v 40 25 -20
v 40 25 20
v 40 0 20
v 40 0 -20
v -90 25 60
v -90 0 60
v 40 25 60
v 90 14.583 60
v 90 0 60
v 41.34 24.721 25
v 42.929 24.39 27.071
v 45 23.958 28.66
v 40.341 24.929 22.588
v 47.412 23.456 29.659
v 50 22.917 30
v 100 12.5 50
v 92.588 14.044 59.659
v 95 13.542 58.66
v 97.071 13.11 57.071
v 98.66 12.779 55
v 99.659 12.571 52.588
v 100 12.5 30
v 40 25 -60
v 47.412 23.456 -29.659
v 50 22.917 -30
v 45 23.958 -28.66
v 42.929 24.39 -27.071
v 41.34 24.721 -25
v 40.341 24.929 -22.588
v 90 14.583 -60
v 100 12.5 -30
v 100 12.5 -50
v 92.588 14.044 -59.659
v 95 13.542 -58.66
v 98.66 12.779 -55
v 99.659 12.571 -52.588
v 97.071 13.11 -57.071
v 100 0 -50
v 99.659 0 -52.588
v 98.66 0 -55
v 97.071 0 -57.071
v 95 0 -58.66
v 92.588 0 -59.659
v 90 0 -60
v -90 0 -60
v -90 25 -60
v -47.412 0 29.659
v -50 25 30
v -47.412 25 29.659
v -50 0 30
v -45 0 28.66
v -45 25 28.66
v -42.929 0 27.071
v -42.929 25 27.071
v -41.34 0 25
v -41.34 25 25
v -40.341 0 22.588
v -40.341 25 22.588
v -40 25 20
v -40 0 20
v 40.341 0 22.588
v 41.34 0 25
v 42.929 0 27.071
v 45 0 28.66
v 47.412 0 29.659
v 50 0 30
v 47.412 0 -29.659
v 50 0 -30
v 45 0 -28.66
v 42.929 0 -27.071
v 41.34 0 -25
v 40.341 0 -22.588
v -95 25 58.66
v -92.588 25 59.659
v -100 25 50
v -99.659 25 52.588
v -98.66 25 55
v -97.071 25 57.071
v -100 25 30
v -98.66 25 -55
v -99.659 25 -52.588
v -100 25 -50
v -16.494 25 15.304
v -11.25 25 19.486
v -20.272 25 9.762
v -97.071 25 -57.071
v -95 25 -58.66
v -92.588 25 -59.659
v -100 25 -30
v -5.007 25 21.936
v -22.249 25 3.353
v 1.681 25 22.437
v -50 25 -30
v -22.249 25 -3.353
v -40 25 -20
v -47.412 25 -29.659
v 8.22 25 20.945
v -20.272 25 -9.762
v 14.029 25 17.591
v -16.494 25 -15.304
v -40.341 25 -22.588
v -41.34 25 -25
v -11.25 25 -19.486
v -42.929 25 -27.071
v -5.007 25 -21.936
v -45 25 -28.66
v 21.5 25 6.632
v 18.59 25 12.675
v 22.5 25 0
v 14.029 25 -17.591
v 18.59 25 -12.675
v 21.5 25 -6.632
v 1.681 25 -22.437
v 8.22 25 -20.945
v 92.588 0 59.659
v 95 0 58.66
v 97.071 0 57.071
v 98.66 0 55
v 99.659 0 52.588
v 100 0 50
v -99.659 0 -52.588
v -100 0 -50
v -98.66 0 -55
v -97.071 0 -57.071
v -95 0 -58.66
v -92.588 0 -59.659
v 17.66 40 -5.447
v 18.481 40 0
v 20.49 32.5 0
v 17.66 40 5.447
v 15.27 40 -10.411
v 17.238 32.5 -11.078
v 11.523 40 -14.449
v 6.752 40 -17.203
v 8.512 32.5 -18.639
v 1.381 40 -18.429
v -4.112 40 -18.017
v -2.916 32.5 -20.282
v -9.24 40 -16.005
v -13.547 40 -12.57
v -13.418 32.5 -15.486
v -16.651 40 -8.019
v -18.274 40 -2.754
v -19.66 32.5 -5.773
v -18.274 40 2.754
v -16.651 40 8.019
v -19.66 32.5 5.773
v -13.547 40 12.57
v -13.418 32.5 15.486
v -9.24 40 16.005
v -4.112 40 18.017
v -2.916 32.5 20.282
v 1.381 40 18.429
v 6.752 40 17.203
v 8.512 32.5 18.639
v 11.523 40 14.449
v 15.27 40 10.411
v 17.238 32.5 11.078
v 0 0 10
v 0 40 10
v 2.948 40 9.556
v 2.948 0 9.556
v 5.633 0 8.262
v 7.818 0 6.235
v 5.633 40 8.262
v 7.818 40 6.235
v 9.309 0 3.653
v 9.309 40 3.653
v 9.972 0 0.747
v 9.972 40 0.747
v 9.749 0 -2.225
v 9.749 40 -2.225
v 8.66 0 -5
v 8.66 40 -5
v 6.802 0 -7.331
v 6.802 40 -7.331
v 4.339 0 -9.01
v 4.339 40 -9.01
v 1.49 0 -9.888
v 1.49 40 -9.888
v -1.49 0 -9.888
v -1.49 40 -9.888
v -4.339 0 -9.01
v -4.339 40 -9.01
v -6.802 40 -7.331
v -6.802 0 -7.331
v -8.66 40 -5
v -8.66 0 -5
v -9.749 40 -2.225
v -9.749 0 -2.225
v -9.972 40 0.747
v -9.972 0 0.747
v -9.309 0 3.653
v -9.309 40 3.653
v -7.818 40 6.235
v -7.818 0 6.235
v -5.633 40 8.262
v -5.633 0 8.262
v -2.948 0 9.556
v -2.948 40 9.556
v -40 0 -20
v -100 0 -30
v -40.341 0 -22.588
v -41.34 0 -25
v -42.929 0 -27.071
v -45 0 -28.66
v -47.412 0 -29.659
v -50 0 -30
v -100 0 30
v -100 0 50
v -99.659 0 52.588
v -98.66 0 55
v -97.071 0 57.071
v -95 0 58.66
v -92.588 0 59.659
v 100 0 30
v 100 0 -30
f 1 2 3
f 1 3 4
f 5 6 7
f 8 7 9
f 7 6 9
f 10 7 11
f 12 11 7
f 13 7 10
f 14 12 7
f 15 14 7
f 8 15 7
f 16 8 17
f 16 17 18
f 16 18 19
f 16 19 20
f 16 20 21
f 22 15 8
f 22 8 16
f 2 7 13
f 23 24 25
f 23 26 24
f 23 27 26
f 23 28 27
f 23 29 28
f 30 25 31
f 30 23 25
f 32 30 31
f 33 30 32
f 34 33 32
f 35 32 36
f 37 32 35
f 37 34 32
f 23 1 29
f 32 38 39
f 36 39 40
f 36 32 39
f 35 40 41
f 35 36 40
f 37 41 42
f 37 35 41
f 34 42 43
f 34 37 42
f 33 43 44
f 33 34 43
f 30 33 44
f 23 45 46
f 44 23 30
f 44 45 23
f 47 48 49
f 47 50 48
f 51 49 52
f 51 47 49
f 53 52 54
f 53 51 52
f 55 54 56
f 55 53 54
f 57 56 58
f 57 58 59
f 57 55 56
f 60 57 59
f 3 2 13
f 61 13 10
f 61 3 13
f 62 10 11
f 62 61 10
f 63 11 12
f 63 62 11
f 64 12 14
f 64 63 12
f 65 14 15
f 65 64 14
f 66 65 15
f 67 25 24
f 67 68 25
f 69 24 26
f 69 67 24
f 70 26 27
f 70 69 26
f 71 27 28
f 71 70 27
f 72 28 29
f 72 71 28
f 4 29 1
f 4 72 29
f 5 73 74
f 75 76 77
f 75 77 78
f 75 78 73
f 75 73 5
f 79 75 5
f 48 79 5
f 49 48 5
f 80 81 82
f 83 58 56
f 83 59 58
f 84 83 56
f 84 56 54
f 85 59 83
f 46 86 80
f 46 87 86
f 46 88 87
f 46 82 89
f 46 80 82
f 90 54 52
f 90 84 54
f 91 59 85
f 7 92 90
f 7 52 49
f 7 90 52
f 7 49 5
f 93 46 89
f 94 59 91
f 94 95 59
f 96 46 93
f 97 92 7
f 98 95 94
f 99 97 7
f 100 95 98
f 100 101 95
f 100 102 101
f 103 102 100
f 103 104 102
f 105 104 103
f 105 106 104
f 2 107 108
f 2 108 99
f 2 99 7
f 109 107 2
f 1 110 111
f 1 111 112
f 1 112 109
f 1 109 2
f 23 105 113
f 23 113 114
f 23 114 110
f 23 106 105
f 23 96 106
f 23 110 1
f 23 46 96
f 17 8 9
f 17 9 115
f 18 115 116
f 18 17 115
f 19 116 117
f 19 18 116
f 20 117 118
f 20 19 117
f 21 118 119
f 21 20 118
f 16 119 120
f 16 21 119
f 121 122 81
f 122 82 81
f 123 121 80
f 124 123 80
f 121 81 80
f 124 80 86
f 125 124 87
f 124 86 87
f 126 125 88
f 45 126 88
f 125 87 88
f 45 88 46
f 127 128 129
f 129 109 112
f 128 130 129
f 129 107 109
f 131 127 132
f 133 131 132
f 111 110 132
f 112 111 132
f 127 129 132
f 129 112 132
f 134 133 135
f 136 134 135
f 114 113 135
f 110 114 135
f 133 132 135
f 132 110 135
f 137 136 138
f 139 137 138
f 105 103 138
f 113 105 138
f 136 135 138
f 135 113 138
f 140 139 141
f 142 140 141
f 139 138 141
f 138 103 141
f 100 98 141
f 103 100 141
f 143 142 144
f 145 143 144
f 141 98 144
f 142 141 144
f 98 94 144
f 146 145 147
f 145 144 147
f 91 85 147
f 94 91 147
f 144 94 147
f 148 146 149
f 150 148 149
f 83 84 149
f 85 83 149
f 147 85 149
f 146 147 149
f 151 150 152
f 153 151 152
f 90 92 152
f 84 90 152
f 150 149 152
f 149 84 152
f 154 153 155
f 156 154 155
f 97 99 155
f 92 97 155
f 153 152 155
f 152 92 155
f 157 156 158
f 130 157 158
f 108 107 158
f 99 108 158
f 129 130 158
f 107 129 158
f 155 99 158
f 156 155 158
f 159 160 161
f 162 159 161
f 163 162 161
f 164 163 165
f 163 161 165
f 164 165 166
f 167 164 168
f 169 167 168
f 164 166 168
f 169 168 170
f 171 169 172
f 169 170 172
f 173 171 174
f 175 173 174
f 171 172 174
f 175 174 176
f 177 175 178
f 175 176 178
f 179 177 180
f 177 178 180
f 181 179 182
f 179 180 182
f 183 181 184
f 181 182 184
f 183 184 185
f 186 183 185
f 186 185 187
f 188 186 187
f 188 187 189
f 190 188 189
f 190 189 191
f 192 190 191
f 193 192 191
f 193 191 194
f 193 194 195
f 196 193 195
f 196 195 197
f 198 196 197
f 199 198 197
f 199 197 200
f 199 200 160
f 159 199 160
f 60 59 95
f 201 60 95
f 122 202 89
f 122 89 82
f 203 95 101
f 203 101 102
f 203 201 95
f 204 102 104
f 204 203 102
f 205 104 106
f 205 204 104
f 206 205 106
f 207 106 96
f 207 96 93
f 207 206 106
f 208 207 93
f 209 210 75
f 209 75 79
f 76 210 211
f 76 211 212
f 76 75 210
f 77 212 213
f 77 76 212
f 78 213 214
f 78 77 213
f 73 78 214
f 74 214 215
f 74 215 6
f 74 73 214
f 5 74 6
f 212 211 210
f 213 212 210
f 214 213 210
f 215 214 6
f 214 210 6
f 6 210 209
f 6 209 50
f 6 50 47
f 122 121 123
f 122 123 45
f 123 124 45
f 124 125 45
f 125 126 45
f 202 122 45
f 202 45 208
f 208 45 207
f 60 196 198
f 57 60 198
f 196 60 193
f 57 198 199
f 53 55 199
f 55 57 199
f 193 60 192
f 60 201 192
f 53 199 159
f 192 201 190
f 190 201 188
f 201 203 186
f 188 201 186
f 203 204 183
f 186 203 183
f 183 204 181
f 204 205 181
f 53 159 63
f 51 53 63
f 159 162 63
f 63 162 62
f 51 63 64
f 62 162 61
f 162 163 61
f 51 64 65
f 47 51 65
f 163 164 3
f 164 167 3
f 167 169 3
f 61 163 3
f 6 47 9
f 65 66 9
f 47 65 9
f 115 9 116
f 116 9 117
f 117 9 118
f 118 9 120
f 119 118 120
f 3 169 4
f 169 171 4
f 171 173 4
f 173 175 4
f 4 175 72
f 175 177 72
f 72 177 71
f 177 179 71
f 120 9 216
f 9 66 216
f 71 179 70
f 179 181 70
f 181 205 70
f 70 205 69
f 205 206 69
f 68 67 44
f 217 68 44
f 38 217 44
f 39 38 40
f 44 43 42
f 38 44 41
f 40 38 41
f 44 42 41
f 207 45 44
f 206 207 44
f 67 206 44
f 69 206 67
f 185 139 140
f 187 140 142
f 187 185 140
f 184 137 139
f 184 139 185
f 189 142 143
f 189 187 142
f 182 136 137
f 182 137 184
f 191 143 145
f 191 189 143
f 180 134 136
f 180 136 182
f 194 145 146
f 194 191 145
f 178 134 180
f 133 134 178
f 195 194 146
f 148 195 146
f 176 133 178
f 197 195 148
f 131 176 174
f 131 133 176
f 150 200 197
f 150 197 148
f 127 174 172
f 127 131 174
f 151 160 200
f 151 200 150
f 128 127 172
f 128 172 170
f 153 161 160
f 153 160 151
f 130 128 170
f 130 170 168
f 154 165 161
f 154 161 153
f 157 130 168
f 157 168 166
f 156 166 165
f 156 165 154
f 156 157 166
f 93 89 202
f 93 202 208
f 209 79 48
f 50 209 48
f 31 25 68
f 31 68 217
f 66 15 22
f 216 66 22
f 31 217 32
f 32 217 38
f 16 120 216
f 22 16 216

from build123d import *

# Parameters (mm, degrees)
SKETCH1_W               = 200
SKETCH1_H               = 120
SKETCH1_R               = 22.5
BOSS_EXTRUDE1_DEPTH     = 25
SKETCH1_3_R             = 22.5
BOSS_EXTRUDE2_DEPTH     = 40
SKETCH2_R               = 10
CUT_EXTRUDE1_DEPTH      = 124.288280059
FILLET1_R               = 10
SKETCH3_W               = 60
SKETCH3_H               = 60
CUT_EXTRUDE2_DEPTH      = 120.268604419
FILLET2_R               = 10
CUT_EXTRUDE3_DEPTH      = 124.288280059
CUT_EXTRUDE3_DEPTH_BACK = 124.288280059


# Read off the part's stored shape, not the designer's step: Draft1
with BuildPart() as part:
    # Sketch1 → Boss-Extrude1 (new body)
    with BuildSketch(Plane(origin=(0, 0, 0), x_dir=(1, 0, 0), z_dir=(0, 1, 0))):
        Rectangle(SKETCH1_W, SKETCH1_H)
        with Locations(Location((0, 0, 0), (0, 0, 270))):
            Circle(SKETCH1_R, mode=Mode.SUBTRACT)
    extrude(amount=BOSS_EXTRUDE1_DEPTH)

    # Sketch1<3> → Boss-Extrude2 (add)
    with BuildSketch(Plane(origin=(0, 0, 0), x_dir=(1, 0, 0), z_dir=(0, 1, 0))):
        with Locations(Location((0, 0, 0), (0, 0, 270))):
            Circle(SKETCH1_3_R)
    extrude(amount=BOSS_EXTRUDE2_DEPTH)

    # Draft1 outline → Draft1 (revolve, cut)
    with BuildSketch(Plane.XY):
        Polygon((22.5, 40), (18.480762114, 40), (22.5, 25), align=None)
    revolve(axis=Axis((0, 0, 0), (0, 1, 0)), mode=Mode.SUBTRACT)

    # Sketch2 → Cut-Extrude1 (cut, through all)
    with BuildSketch(Plane(origin=(0, 40, 0), x_dir=(1, 0, 0), z_dir=(0, 1, 0))):
        with Locations(Location((0, 0, 0), (0, 0, 270))):
            Circle(SKETCH2_R)
    extrude(amount=-CUT_EXTRUDE1_DEPTH, mode=Mode.SUBTRACT)

    # Fillet1
    fillet1_edges = [part.edges().sort_by_distance(p)[0] for p in [
        (-100, 12.5, -60),
        (100, 12.5, -60),
        (100, 12.5, 60),
        (-100, 12.5, 60),
    ]]
    fillet(fillet1_edges, radius=FILLET1_R)

    # Sketch3 → Cut-Extrude2 (cut, through all)
    with BuildSketch(Plane(origin=(0, 25, 0), x_dir=(1, 0, 0), z_dir=(0, 1, 0))):
        with Locations((-70, 0)):
            Rectangle(SKETCH3_W, SKETCH3_H)
        with Locations((70, 0)):
            Rectangle(SKETCH3_W, SKETCH3_H)
    extrude(amount=-CUT_EXTRUDE2_DEPTH, mode=Mode.SUBTRACT)

    # Fillet2
    fillet2_edges = [part.edges().sort_by_distance(p)[0] for p in [
        (-40, 12.5, -30),
        (-40, 12.5, 30),
        (40, 12.5, -30),
        (40, 12.5, 30),
    ]]
    fillet(fillet2_edges, radius=FILLET2_R)

    # Sketch4 → Cut-Extrude3 (cut, two sides: drawn at the far end of the back side and taken through both)
    with BuildSketch(Plane.XY.offset(-CUT_EXTRUDE3_DEPTH_BACK)):
        Polygon((40, 25), (100, 12.5), (100, 25), align=None)
    extrude(amount=CUT_EXTRUDE3_DEPTH + CUT_EXTRUDE3_DEPTH_BACK, mode=Mode.SUBTRACT)


solid = part.part
